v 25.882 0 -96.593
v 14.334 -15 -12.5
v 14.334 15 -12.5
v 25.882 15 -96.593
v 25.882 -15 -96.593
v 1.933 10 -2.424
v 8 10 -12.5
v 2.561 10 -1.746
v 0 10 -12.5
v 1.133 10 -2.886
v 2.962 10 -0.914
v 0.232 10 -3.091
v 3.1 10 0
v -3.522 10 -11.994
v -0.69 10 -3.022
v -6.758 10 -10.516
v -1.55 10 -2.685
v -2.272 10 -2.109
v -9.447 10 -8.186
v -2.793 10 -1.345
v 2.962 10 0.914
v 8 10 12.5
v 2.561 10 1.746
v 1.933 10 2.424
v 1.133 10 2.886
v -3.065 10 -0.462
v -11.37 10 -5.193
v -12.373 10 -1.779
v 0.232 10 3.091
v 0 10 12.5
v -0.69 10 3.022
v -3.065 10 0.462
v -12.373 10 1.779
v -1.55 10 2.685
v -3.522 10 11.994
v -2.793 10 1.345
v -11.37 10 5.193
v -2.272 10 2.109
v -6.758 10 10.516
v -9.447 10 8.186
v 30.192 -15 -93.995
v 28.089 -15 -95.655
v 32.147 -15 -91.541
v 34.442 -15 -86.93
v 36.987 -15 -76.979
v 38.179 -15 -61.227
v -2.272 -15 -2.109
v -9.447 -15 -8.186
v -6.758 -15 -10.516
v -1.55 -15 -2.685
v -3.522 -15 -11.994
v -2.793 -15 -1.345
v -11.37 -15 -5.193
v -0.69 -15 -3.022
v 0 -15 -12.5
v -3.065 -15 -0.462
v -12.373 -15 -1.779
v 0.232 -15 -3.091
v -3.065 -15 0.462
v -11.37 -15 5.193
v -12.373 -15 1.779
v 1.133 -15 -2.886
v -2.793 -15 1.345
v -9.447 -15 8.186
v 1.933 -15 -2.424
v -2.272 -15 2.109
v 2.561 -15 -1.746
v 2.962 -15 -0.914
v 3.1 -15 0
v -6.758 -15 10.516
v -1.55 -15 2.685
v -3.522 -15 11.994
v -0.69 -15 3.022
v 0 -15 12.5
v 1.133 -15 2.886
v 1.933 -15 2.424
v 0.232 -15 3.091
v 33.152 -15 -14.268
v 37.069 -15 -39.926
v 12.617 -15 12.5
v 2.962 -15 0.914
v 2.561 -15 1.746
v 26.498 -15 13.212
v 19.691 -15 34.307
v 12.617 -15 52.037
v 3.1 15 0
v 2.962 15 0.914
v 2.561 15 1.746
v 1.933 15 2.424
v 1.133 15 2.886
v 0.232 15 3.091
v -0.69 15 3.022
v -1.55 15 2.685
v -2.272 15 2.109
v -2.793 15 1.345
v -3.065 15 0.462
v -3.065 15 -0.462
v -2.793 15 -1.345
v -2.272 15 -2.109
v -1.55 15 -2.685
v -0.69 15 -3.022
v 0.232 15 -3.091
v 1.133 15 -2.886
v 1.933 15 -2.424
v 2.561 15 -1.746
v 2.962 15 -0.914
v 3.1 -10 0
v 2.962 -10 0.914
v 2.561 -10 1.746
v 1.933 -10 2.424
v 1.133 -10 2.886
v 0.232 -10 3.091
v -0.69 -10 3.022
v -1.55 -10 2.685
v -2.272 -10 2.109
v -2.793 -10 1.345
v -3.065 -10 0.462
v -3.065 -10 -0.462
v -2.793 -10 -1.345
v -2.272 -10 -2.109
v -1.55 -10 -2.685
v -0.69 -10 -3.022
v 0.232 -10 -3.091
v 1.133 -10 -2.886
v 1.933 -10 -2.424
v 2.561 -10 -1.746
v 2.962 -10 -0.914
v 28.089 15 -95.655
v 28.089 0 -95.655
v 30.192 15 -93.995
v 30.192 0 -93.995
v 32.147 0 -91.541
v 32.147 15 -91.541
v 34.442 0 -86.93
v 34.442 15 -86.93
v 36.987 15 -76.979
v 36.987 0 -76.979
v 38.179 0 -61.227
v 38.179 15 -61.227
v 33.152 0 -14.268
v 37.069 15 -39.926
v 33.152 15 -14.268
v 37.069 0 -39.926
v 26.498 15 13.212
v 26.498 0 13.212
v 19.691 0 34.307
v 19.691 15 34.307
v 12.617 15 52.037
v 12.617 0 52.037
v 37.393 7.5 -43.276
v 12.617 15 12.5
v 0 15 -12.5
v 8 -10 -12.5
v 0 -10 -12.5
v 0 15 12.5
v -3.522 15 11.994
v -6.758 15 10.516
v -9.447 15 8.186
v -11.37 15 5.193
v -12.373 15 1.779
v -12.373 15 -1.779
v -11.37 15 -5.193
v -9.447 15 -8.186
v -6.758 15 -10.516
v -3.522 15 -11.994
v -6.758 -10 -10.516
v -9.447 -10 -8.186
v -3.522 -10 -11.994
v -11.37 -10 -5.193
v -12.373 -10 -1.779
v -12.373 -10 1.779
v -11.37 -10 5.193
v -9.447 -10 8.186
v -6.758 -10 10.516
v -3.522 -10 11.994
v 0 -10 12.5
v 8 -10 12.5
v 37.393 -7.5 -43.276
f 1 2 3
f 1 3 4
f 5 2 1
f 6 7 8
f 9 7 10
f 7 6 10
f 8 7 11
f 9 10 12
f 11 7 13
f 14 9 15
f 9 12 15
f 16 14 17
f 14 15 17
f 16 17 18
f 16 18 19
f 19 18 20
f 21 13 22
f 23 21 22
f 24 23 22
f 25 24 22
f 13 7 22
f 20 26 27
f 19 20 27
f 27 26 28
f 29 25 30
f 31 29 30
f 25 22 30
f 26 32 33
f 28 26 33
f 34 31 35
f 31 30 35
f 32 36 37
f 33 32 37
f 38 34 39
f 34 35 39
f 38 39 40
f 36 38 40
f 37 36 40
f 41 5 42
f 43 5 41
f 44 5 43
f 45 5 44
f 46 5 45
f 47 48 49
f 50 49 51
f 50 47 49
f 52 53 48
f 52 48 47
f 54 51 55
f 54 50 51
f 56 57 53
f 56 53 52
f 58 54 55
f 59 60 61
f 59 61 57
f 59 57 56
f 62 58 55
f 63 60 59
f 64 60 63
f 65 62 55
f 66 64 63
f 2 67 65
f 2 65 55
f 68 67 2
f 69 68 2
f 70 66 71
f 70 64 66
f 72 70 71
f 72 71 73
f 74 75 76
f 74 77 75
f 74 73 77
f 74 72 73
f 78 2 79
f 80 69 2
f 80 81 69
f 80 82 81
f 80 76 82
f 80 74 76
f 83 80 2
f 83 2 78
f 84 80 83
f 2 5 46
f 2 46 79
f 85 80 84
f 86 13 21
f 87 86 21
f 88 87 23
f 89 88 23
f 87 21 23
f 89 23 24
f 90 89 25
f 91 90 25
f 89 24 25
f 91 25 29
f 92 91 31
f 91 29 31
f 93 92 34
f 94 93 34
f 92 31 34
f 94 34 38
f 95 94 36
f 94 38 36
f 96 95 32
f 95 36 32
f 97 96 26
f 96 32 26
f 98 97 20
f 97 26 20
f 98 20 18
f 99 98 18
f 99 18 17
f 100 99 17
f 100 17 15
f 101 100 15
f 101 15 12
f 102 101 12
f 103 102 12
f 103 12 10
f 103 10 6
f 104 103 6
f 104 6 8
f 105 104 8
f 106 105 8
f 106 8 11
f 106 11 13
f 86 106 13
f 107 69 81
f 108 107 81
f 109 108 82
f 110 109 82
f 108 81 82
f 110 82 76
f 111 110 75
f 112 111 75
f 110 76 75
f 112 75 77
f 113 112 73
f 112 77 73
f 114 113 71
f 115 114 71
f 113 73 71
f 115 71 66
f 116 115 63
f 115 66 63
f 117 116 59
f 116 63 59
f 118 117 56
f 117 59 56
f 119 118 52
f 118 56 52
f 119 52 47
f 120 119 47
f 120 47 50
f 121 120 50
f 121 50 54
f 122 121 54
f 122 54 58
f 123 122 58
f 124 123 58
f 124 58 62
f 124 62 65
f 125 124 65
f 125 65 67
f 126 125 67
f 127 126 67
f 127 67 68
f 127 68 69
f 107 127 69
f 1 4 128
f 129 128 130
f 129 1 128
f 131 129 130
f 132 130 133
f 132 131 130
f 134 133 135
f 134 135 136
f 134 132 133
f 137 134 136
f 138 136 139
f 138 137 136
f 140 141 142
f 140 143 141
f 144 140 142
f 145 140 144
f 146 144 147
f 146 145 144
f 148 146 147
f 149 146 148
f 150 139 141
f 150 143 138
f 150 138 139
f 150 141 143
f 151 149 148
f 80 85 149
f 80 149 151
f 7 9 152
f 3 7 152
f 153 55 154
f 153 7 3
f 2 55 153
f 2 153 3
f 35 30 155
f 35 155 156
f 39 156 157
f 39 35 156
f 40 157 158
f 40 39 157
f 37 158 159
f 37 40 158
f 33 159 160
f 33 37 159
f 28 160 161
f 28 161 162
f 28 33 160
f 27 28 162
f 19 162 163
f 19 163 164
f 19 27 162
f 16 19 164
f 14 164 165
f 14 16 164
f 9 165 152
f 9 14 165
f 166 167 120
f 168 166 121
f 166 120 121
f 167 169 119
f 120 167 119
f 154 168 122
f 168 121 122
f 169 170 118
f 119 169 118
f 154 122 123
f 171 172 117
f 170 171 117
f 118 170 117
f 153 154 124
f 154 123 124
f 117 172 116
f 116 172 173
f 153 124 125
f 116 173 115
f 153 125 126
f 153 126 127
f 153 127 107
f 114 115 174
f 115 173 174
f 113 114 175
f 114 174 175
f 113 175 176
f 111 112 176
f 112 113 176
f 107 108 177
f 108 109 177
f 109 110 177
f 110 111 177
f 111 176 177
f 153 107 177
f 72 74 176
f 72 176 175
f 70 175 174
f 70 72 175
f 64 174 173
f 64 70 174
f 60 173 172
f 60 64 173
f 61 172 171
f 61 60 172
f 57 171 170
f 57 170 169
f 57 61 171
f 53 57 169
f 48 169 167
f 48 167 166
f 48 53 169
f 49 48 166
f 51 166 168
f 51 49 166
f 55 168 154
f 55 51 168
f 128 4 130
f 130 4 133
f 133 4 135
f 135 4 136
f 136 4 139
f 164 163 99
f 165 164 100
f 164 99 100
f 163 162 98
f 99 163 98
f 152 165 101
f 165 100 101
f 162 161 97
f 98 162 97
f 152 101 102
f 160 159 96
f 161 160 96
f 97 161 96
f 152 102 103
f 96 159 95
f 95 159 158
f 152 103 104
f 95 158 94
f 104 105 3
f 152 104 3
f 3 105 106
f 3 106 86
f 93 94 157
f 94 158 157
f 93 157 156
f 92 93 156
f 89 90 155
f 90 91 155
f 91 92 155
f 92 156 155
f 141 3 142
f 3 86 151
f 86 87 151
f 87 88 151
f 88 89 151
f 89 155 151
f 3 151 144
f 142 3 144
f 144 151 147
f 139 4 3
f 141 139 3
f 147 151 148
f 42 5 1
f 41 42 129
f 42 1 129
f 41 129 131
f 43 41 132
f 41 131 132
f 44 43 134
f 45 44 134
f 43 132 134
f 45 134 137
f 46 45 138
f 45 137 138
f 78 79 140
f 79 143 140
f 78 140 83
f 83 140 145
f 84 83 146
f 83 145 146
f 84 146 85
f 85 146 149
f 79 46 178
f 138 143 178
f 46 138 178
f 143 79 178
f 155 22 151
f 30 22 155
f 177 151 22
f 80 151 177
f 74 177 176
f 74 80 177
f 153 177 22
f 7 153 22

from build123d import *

# Parameters (mm, degrees)
F1_DEPTH = 15
F2_W     = 19.2250516646
F2_H     = 20
F2_W_2   = 8
F3_DEPTH = 109.0935827289
F4_R     = 3.1
F5_DEPTH = 25
F6_DEPTH = 55.0010001


with BuildPart() as f1:
    # F0 (on Front) → F1 (new body, symmetric)
    with BuildSketch(Plane.XZ):
        with BuildLine():
            ThreePointArc((0, -12.5), (8.8388347648, -8.8388347648), (12.5, 0))
            ThreePointArc((12.5, 0), (8.8388347648, 8.8388347648), (0, 12.5))
            ThreePointArc((0, 12.5), (-12.5, 0), (0, -12.5))
        make_face()
        with BuildLine():
            ThreePointArc((0, 12.5), (8.8388347648, 8.8388347648), (12.5, 0))
            ThreePointArc((12.5, 0), (8.8388347648, -8.8388347648), (0, -12.5))
            Line((0, -12.5), (14.3338776639, -12.5))
            Line((14.3338776639, -12.5), (12.6173132409, 0))
            Line((12.6173132409, 0), (12.6173132409, 12.5))
            Line((12.6173132409, 12.5), (0, 12.5))
        make_face()
        with BuildLine():
            Line((12.6173132409, 52.036685962), (12.6173132409, 12.5))
            Line((12.6173132409, 12.5), (12.6173132409, 0))
            Line((12.6173132409, 0), (14.3338776639, -12.5))
            Line((14.3338776639, -12.5), (25.8819045103, -96.5925826289))
            add(Edge.make_bspline(
                [(25.8819045103, -96.5925826289), (72.6372622036, -84.0645222931), (12.6173132409, 52.036685962)],
                knots=[3.1415926536, 3.1415926536, 3.1415926536, 5.2016568498, 5.2016568498, 5.2016568498], degree=2, weights=[1, 0.514791327, 1]))
        make_face()
    extrude(amount=F1_DEPTH, both=True)

    # F2 (on face) → F3 (cut, through all)
    with BuildSketch(Plane.XY.offset(12.5)):
        with Locations((-9.6125258323, 0)):
            Rectangle(F2_W, F2_H)
        with Locations((4, 0)):
            Rectangle(F2_W_2, F2_H)
    extrude(amount=-F3_DEPTH, mode=Mode.SUBTRACT)

    # F4 (on face) → F5 (join)
    with BuildSketch(Plane.XZ.offset(15)):
        Circle(F4_R)
    extrude(amount=F5_DEPTH)

    # F6 (cut, through all): a face of the model
    f6_faces = [f1.faces().sort_by_distance(p)[0] for p in [
        (0, -40, 0),
    ]]
    extrude(f6_faces, amount=-F6_DEPTH, mode=Mode.SUBTRACT)


solid = f1.part
